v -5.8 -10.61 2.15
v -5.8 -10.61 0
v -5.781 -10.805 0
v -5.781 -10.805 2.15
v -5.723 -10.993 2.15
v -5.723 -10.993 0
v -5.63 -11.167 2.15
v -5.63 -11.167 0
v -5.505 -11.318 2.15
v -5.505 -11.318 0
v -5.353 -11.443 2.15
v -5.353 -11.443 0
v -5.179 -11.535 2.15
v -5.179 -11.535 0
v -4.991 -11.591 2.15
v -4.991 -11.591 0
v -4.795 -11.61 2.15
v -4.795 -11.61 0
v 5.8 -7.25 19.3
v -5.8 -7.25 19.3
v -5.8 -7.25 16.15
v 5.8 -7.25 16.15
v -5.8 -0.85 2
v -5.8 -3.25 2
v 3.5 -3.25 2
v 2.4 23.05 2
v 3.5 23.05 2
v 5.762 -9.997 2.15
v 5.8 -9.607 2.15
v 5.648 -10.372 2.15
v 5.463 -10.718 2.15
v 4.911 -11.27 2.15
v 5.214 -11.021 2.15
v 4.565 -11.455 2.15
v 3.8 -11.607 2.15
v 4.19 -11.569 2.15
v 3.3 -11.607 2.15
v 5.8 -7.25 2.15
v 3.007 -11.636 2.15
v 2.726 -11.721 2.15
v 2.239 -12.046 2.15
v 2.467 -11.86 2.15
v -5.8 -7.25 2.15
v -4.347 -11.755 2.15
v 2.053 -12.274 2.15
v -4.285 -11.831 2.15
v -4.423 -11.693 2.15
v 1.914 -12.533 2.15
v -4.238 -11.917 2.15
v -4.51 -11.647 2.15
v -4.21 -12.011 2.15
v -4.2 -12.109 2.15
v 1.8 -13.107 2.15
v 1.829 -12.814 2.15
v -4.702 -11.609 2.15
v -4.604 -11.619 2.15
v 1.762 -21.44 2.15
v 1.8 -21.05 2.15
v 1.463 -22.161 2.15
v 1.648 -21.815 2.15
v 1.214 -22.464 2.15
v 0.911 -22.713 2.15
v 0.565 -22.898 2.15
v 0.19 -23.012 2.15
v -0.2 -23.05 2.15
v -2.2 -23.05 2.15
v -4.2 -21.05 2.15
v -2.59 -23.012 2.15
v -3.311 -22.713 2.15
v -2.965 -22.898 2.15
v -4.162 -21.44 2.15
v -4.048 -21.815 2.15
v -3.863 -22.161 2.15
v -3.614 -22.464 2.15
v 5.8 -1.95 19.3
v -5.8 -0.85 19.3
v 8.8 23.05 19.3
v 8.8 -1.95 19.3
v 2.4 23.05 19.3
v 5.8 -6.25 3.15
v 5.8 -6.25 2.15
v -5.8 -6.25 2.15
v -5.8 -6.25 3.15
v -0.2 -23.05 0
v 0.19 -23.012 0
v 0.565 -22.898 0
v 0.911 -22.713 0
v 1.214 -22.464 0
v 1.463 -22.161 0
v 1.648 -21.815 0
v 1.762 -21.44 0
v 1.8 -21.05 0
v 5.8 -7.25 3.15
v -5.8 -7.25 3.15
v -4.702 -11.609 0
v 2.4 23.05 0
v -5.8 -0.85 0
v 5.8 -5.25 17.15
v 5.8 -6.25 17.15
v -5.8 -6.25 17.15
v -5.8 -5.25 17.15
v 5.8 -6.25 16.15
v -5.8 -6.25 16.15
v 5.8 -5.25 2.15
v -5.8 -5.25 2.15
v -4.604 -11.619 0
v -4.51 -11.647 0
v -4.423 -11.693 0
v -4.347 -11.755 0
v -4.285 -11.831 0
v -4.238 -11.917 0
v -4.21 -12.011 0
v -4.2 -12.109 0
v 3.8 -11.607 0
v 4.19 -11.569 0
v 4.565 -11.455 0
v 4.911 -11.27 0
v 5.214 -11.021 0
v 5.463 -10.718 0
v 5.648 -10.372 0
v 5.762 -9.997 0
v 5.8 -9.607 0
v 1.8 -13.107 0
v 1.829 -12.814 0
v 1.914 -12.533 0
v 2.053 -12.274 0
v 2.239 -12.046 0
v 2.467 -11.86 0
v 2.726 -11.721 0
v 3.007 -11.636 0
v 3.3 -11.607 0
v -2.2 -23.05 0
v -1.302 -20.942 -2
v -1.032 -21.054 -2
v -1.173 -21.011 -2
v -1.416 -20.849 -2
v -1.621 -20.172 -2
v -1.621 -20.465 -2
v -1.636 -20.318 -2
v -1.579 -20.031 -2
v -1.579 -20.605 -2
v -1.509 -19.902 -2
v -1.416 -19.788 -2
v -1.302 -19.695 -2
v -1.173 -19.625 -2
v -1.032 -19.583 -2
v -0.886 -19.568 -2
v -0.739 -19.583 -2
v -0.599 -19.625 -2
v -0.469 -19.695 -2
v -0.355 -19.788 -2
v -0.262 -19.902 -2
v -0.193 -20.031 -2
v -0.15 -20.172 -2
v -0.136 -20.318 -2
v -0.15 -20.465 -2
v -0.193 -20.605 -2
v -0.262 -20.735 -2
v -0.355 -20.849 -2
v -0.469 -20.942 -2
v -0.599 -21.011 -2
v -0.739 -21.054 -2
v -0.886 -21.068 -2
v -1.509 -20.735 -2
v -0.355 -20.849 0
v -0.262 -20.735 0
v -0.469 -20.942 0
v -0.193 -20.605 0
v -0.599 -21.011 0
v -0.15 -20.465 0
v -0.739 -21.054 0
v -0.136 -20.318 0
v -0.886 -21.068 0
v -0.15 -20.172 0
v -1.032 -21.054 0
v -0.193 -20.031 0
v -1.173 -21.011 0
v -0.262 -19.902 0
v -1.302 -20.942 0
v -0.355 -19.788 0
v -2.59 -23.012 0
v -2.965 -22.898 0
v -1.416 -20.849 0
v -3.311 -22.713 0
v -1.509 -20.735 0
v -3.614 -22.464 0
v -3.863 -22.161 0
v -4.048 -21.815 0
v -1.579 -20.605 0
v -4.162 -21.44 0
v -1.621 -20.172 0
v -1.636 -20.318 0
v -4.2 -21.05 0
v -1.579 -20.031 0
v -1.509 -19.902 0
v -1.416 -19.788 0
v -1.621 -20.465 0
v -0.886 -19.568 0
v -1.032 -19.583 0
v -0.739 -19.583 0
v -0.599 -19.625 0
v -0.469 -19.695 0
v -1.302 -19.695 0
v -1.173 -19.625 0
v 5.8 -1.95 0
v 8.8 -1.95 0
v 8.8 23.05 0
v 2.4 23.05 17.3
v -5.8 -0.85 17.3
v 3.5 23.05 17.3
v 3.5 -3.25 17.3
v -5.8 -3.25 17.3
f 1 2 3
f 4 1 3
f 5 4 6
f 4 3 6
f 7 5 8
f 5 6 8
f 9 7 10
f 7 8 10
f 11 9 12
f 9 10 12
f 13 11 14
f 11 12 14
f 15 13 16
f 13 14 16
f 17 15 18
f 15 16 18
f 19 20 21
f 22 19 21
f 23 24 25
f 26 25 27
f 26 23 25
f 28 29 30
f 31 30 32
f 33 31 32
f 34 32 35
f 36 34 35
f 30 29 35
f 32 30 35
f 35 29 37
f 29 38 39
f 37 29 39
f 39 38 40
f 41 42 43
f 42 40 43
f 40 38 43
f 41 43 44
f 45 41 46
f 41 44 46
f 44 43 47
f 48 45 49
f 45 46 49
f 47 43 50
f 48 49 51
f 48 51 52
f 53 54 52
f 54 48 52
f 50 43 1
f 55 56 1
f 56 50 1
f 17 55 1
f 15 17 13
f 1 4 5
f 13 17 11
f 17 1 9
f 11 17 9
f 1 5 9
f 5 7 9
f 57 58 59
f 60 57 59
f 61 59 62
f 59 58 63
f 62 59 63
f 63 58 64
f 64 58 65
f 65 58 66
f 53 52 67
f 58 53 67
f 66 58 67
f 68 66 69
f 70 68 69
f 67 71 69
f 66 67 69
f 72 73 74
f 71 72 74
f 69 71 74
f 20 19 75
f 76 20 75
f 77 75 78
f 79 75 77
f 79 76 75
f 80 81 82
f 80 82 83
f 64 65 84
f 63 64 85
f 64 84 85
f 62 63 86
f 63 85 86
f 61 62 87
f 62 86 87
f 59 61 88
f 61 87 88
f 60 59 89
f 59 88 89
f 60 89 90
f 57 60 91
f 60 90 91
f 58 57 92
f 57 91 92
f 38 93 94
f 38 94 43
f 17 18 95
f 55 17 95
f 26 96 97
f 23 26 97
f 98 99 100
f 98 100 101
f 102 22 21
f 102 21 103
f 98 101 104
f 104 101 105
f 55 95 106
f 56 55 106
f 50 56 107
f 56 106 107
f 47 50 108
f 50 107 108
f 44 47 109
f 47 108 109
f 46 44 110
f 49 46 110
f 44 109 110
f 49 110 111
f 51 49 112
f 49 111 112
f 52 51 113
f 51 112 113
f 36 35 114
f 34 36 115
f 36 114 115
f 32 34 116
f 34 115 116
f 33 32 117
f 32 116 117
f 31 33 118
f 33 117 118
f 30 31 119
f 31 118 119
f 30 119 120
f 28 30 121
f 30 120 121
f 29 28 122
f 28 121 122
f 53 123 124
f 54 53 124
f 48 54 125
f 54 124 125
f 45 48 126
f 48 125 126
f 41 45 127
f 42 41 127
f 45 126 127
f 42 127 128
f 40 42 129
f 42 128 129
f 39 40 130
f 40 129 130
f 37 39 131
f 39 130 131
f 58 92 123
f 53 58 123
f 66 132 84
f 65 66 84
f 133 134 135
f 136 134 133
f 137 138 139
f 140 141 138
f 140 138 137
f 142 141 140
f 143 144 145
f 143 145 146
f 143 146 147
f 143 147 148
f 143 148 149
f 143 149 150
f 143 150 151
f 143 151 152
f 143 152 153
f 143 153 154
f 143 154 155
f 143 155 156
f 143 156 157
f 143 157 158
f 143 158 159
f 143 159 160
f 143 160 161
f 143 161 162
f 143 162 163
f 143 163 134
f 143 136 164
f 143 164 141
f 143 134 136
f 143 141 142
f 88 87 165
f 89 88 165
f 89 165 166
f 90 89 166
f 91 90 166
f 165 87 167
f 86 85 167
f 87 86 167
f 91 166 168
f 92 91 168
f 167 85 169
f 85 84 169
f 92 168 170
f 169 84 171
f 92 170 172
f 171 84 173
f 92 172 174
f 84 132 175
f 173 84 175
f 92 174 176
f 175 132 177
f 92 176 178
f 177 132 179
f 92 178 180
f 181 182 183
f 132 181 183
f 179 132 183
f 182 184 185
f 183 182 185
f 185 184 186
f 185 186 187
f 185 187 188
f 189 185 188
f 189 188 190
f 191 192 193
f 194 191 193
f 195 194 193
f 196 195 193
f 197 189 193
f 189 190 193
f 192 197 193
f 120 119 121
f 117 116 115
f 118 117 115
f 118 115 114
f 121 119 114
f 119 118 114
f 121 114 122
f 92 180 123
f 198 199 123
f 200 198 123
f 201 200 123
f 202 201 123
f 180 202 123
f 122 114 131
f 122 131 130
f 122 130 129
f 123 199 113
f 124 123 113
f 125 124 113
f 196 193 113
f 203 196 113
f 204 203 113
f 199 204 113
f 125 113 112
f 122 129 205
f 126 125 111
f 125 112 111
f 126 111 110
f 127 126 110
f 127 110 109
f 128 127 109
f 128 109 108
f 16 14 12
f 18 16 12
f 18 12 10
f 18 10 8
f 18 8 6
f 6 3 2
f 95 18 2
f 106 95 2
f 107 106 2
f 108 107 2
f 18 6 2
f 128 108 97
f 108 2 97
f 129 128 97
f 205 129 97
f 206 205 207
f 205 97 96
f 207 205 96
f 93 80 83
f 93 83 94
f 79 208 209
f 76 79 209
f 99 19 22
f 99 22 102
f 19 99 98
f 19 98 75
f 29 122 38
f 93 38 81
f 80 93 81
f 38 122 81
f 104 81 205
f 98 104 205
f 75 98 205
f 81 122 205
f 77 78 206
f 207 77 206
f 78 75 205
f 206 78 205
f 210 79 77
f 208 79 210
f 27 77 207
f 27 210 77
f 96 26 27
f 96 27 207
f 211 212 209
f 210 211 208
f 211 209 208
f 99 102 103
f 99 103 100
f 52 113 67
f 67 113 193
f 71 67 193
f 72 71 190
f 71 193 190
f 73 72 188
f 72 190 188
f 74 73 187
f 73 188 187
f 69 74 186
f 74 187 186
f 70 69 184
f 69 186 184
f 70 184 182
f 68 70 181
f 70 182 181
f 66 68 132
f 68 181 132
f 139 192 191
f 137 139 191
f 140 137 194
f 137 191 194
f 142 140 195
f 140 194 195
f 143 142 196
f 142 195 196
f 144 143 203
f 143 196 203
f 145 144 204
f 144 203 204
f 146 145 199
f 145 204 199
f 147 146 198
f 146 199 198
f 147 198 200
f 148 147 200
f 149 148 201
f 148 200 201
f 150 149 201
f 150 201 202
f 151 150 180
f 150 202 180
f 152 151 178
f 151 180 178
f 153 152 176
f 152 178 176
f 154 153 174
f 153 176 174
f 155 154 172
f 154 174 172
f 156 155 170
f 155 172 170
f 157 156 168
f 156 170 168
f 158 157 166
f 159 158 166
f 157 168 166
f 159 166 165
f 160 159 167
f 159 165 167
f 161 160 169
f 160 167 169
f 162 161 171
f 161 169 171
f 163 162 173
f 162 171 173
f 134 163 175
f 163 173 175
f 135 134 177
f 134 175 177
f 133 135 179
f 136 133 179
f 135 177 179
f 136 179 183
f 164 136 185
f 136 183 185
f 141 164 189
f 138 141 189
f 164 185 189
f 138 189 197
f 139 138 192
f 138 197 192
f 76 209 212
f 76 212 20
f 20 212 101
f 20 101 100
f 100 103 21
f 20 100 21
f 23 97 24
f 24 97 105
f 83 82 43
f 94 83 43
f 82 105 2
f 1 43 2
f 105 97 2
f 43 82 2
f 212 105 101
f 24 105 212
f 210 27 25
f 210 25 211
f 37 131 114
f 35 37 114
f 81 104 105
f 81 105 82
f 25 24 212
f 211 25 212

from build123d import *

# Parameters (mm, degrees)
SALIENTE_EXTRUIR1_DEPTH = 19.3
CROQUIS2_W              = 15.3
CROQUIS2_H              = 26.3
CORTAR_EXTRUIR1_DEPTH   = 9.3
CORTAR_EXTRUIR2_DEPTH   = 12
CROQUIS5_R              = 0.75
SALIENTE_EXTRUIR2_DEPTH = 2
CROQUIS6_W              = 19.3
CROQUIS6_H              = 25
SALIENTE_EXTRUIR3_DEPTH = 3


with BuildPart() as part:
    # Croquis1 → Saliente-Extruir1 (new body)
    with BuildSketch(Plane.XY):
        with BuildLine():
            Line((5.8, 23.05), (2.4, 23.05))
            Line((2.4, 23.05), (-5.8, -0.85))
            Line((-5.8, -0.85), (-5.8, -10.609737321))
            ThreePointArc((-5.8, -10.609737321), (-5.505459406, -11.318487649), (-4.795345946, -11.609726491))
            Line((-4.795345946, -11.609726491), (-4.702327027, -11.609293571))
            ThreePointArc((-4.702327027, -11.609293571), (-4.347270297, -11.754912992), (-4.2, -12.109288156))
            Line((-4.2, -12.109288156), (-4.2, -21.05))
            ThreePointArc((-4.2, -21.05), (-3.614213562, -22.464213562), (-2.2, -23.05))
            Line((-2.2, -23.05), (-0.2, -23.05))
            ThreePointArc((-0.2, -23.05), (1.214213562, -22.464213562), (1.8, -21.05))
            Line((1.8, -21.05), (1.8, -13.106955688))
            ThreePointArc((1.8, -13.106955688), (2.239339828, -12.046295517), (3.3, -11.606955688))
            Line((3.3, -11.606955688), (3.8, -11.606955688))
            ThreePointArc((3.8, -11.606955688), (5.214213562, -11.021169251), (5.8, -9.606955688))
            Line((5.8, -9.606955688), (5.8, 23.05))
        make_face()
    extrude(amount=SALIENTE_EXTRUIR1_DEPTH)

    # Croquis2 → Cortar-Extruir1 (cut)
    with BuildSketch(Plane.ZY.offset(5.8)):
        with Locations((9.65, 9.9)):
            Rectangle(CROQUIS2_W, CROQUIS2_H)
    extrude(amount=-CORTAR_EXTRUIR1_DEPTH, mode=Mode.SUBTRACT)

    # Croquis4 → Cortar-Extruir2 (cut)
    with BuildSketch(Plane.ZY.offset(5.8)):
        Polygon((2.15, -5.25), (2.15, -6.25), (3.15, -6.25), (3.15, -7.25), (2.15, -7.25), (2.15, -23.25), (19.55, -23.25), (19.55, -7.25), (16.15, -7.25), (16.15, -6.25), (17.15, -6.25), (17.15, -5.25), align=None)
    extrude(amount=-CORTAR_EXTRUIR2_DEPTH, mode=Mode.SUBTRACT)

    # Croquis5 → Saliente-Extruir2 (add)
    with BuildSketch(Plane(origin=(0, 0, 0), x_dir=(-1, 0, 0), z_dir=(0, 0, -1))):
        with Locations((0.885806677, -20.318206006)):
            Circle(CROQUIS5_R)
    extrude(amount=SALIENTE_EXTRUIR2_DEPTH)

    # Croquis6 → Saliente-Extruir3 (add)
    with BuildSketch(Plane(origin=(5.8, 0, 0), x_dir=(0, 0, -1), z_dir=(1, 0, 0))):
        with Locations((-9.65, 10.55)):
            Rectangle(CROQUIS6_W, CROQUIS6_H)
    extrude(amount=SALIENTE_EXTRUIR3_DEPTH)


solid = part.part
